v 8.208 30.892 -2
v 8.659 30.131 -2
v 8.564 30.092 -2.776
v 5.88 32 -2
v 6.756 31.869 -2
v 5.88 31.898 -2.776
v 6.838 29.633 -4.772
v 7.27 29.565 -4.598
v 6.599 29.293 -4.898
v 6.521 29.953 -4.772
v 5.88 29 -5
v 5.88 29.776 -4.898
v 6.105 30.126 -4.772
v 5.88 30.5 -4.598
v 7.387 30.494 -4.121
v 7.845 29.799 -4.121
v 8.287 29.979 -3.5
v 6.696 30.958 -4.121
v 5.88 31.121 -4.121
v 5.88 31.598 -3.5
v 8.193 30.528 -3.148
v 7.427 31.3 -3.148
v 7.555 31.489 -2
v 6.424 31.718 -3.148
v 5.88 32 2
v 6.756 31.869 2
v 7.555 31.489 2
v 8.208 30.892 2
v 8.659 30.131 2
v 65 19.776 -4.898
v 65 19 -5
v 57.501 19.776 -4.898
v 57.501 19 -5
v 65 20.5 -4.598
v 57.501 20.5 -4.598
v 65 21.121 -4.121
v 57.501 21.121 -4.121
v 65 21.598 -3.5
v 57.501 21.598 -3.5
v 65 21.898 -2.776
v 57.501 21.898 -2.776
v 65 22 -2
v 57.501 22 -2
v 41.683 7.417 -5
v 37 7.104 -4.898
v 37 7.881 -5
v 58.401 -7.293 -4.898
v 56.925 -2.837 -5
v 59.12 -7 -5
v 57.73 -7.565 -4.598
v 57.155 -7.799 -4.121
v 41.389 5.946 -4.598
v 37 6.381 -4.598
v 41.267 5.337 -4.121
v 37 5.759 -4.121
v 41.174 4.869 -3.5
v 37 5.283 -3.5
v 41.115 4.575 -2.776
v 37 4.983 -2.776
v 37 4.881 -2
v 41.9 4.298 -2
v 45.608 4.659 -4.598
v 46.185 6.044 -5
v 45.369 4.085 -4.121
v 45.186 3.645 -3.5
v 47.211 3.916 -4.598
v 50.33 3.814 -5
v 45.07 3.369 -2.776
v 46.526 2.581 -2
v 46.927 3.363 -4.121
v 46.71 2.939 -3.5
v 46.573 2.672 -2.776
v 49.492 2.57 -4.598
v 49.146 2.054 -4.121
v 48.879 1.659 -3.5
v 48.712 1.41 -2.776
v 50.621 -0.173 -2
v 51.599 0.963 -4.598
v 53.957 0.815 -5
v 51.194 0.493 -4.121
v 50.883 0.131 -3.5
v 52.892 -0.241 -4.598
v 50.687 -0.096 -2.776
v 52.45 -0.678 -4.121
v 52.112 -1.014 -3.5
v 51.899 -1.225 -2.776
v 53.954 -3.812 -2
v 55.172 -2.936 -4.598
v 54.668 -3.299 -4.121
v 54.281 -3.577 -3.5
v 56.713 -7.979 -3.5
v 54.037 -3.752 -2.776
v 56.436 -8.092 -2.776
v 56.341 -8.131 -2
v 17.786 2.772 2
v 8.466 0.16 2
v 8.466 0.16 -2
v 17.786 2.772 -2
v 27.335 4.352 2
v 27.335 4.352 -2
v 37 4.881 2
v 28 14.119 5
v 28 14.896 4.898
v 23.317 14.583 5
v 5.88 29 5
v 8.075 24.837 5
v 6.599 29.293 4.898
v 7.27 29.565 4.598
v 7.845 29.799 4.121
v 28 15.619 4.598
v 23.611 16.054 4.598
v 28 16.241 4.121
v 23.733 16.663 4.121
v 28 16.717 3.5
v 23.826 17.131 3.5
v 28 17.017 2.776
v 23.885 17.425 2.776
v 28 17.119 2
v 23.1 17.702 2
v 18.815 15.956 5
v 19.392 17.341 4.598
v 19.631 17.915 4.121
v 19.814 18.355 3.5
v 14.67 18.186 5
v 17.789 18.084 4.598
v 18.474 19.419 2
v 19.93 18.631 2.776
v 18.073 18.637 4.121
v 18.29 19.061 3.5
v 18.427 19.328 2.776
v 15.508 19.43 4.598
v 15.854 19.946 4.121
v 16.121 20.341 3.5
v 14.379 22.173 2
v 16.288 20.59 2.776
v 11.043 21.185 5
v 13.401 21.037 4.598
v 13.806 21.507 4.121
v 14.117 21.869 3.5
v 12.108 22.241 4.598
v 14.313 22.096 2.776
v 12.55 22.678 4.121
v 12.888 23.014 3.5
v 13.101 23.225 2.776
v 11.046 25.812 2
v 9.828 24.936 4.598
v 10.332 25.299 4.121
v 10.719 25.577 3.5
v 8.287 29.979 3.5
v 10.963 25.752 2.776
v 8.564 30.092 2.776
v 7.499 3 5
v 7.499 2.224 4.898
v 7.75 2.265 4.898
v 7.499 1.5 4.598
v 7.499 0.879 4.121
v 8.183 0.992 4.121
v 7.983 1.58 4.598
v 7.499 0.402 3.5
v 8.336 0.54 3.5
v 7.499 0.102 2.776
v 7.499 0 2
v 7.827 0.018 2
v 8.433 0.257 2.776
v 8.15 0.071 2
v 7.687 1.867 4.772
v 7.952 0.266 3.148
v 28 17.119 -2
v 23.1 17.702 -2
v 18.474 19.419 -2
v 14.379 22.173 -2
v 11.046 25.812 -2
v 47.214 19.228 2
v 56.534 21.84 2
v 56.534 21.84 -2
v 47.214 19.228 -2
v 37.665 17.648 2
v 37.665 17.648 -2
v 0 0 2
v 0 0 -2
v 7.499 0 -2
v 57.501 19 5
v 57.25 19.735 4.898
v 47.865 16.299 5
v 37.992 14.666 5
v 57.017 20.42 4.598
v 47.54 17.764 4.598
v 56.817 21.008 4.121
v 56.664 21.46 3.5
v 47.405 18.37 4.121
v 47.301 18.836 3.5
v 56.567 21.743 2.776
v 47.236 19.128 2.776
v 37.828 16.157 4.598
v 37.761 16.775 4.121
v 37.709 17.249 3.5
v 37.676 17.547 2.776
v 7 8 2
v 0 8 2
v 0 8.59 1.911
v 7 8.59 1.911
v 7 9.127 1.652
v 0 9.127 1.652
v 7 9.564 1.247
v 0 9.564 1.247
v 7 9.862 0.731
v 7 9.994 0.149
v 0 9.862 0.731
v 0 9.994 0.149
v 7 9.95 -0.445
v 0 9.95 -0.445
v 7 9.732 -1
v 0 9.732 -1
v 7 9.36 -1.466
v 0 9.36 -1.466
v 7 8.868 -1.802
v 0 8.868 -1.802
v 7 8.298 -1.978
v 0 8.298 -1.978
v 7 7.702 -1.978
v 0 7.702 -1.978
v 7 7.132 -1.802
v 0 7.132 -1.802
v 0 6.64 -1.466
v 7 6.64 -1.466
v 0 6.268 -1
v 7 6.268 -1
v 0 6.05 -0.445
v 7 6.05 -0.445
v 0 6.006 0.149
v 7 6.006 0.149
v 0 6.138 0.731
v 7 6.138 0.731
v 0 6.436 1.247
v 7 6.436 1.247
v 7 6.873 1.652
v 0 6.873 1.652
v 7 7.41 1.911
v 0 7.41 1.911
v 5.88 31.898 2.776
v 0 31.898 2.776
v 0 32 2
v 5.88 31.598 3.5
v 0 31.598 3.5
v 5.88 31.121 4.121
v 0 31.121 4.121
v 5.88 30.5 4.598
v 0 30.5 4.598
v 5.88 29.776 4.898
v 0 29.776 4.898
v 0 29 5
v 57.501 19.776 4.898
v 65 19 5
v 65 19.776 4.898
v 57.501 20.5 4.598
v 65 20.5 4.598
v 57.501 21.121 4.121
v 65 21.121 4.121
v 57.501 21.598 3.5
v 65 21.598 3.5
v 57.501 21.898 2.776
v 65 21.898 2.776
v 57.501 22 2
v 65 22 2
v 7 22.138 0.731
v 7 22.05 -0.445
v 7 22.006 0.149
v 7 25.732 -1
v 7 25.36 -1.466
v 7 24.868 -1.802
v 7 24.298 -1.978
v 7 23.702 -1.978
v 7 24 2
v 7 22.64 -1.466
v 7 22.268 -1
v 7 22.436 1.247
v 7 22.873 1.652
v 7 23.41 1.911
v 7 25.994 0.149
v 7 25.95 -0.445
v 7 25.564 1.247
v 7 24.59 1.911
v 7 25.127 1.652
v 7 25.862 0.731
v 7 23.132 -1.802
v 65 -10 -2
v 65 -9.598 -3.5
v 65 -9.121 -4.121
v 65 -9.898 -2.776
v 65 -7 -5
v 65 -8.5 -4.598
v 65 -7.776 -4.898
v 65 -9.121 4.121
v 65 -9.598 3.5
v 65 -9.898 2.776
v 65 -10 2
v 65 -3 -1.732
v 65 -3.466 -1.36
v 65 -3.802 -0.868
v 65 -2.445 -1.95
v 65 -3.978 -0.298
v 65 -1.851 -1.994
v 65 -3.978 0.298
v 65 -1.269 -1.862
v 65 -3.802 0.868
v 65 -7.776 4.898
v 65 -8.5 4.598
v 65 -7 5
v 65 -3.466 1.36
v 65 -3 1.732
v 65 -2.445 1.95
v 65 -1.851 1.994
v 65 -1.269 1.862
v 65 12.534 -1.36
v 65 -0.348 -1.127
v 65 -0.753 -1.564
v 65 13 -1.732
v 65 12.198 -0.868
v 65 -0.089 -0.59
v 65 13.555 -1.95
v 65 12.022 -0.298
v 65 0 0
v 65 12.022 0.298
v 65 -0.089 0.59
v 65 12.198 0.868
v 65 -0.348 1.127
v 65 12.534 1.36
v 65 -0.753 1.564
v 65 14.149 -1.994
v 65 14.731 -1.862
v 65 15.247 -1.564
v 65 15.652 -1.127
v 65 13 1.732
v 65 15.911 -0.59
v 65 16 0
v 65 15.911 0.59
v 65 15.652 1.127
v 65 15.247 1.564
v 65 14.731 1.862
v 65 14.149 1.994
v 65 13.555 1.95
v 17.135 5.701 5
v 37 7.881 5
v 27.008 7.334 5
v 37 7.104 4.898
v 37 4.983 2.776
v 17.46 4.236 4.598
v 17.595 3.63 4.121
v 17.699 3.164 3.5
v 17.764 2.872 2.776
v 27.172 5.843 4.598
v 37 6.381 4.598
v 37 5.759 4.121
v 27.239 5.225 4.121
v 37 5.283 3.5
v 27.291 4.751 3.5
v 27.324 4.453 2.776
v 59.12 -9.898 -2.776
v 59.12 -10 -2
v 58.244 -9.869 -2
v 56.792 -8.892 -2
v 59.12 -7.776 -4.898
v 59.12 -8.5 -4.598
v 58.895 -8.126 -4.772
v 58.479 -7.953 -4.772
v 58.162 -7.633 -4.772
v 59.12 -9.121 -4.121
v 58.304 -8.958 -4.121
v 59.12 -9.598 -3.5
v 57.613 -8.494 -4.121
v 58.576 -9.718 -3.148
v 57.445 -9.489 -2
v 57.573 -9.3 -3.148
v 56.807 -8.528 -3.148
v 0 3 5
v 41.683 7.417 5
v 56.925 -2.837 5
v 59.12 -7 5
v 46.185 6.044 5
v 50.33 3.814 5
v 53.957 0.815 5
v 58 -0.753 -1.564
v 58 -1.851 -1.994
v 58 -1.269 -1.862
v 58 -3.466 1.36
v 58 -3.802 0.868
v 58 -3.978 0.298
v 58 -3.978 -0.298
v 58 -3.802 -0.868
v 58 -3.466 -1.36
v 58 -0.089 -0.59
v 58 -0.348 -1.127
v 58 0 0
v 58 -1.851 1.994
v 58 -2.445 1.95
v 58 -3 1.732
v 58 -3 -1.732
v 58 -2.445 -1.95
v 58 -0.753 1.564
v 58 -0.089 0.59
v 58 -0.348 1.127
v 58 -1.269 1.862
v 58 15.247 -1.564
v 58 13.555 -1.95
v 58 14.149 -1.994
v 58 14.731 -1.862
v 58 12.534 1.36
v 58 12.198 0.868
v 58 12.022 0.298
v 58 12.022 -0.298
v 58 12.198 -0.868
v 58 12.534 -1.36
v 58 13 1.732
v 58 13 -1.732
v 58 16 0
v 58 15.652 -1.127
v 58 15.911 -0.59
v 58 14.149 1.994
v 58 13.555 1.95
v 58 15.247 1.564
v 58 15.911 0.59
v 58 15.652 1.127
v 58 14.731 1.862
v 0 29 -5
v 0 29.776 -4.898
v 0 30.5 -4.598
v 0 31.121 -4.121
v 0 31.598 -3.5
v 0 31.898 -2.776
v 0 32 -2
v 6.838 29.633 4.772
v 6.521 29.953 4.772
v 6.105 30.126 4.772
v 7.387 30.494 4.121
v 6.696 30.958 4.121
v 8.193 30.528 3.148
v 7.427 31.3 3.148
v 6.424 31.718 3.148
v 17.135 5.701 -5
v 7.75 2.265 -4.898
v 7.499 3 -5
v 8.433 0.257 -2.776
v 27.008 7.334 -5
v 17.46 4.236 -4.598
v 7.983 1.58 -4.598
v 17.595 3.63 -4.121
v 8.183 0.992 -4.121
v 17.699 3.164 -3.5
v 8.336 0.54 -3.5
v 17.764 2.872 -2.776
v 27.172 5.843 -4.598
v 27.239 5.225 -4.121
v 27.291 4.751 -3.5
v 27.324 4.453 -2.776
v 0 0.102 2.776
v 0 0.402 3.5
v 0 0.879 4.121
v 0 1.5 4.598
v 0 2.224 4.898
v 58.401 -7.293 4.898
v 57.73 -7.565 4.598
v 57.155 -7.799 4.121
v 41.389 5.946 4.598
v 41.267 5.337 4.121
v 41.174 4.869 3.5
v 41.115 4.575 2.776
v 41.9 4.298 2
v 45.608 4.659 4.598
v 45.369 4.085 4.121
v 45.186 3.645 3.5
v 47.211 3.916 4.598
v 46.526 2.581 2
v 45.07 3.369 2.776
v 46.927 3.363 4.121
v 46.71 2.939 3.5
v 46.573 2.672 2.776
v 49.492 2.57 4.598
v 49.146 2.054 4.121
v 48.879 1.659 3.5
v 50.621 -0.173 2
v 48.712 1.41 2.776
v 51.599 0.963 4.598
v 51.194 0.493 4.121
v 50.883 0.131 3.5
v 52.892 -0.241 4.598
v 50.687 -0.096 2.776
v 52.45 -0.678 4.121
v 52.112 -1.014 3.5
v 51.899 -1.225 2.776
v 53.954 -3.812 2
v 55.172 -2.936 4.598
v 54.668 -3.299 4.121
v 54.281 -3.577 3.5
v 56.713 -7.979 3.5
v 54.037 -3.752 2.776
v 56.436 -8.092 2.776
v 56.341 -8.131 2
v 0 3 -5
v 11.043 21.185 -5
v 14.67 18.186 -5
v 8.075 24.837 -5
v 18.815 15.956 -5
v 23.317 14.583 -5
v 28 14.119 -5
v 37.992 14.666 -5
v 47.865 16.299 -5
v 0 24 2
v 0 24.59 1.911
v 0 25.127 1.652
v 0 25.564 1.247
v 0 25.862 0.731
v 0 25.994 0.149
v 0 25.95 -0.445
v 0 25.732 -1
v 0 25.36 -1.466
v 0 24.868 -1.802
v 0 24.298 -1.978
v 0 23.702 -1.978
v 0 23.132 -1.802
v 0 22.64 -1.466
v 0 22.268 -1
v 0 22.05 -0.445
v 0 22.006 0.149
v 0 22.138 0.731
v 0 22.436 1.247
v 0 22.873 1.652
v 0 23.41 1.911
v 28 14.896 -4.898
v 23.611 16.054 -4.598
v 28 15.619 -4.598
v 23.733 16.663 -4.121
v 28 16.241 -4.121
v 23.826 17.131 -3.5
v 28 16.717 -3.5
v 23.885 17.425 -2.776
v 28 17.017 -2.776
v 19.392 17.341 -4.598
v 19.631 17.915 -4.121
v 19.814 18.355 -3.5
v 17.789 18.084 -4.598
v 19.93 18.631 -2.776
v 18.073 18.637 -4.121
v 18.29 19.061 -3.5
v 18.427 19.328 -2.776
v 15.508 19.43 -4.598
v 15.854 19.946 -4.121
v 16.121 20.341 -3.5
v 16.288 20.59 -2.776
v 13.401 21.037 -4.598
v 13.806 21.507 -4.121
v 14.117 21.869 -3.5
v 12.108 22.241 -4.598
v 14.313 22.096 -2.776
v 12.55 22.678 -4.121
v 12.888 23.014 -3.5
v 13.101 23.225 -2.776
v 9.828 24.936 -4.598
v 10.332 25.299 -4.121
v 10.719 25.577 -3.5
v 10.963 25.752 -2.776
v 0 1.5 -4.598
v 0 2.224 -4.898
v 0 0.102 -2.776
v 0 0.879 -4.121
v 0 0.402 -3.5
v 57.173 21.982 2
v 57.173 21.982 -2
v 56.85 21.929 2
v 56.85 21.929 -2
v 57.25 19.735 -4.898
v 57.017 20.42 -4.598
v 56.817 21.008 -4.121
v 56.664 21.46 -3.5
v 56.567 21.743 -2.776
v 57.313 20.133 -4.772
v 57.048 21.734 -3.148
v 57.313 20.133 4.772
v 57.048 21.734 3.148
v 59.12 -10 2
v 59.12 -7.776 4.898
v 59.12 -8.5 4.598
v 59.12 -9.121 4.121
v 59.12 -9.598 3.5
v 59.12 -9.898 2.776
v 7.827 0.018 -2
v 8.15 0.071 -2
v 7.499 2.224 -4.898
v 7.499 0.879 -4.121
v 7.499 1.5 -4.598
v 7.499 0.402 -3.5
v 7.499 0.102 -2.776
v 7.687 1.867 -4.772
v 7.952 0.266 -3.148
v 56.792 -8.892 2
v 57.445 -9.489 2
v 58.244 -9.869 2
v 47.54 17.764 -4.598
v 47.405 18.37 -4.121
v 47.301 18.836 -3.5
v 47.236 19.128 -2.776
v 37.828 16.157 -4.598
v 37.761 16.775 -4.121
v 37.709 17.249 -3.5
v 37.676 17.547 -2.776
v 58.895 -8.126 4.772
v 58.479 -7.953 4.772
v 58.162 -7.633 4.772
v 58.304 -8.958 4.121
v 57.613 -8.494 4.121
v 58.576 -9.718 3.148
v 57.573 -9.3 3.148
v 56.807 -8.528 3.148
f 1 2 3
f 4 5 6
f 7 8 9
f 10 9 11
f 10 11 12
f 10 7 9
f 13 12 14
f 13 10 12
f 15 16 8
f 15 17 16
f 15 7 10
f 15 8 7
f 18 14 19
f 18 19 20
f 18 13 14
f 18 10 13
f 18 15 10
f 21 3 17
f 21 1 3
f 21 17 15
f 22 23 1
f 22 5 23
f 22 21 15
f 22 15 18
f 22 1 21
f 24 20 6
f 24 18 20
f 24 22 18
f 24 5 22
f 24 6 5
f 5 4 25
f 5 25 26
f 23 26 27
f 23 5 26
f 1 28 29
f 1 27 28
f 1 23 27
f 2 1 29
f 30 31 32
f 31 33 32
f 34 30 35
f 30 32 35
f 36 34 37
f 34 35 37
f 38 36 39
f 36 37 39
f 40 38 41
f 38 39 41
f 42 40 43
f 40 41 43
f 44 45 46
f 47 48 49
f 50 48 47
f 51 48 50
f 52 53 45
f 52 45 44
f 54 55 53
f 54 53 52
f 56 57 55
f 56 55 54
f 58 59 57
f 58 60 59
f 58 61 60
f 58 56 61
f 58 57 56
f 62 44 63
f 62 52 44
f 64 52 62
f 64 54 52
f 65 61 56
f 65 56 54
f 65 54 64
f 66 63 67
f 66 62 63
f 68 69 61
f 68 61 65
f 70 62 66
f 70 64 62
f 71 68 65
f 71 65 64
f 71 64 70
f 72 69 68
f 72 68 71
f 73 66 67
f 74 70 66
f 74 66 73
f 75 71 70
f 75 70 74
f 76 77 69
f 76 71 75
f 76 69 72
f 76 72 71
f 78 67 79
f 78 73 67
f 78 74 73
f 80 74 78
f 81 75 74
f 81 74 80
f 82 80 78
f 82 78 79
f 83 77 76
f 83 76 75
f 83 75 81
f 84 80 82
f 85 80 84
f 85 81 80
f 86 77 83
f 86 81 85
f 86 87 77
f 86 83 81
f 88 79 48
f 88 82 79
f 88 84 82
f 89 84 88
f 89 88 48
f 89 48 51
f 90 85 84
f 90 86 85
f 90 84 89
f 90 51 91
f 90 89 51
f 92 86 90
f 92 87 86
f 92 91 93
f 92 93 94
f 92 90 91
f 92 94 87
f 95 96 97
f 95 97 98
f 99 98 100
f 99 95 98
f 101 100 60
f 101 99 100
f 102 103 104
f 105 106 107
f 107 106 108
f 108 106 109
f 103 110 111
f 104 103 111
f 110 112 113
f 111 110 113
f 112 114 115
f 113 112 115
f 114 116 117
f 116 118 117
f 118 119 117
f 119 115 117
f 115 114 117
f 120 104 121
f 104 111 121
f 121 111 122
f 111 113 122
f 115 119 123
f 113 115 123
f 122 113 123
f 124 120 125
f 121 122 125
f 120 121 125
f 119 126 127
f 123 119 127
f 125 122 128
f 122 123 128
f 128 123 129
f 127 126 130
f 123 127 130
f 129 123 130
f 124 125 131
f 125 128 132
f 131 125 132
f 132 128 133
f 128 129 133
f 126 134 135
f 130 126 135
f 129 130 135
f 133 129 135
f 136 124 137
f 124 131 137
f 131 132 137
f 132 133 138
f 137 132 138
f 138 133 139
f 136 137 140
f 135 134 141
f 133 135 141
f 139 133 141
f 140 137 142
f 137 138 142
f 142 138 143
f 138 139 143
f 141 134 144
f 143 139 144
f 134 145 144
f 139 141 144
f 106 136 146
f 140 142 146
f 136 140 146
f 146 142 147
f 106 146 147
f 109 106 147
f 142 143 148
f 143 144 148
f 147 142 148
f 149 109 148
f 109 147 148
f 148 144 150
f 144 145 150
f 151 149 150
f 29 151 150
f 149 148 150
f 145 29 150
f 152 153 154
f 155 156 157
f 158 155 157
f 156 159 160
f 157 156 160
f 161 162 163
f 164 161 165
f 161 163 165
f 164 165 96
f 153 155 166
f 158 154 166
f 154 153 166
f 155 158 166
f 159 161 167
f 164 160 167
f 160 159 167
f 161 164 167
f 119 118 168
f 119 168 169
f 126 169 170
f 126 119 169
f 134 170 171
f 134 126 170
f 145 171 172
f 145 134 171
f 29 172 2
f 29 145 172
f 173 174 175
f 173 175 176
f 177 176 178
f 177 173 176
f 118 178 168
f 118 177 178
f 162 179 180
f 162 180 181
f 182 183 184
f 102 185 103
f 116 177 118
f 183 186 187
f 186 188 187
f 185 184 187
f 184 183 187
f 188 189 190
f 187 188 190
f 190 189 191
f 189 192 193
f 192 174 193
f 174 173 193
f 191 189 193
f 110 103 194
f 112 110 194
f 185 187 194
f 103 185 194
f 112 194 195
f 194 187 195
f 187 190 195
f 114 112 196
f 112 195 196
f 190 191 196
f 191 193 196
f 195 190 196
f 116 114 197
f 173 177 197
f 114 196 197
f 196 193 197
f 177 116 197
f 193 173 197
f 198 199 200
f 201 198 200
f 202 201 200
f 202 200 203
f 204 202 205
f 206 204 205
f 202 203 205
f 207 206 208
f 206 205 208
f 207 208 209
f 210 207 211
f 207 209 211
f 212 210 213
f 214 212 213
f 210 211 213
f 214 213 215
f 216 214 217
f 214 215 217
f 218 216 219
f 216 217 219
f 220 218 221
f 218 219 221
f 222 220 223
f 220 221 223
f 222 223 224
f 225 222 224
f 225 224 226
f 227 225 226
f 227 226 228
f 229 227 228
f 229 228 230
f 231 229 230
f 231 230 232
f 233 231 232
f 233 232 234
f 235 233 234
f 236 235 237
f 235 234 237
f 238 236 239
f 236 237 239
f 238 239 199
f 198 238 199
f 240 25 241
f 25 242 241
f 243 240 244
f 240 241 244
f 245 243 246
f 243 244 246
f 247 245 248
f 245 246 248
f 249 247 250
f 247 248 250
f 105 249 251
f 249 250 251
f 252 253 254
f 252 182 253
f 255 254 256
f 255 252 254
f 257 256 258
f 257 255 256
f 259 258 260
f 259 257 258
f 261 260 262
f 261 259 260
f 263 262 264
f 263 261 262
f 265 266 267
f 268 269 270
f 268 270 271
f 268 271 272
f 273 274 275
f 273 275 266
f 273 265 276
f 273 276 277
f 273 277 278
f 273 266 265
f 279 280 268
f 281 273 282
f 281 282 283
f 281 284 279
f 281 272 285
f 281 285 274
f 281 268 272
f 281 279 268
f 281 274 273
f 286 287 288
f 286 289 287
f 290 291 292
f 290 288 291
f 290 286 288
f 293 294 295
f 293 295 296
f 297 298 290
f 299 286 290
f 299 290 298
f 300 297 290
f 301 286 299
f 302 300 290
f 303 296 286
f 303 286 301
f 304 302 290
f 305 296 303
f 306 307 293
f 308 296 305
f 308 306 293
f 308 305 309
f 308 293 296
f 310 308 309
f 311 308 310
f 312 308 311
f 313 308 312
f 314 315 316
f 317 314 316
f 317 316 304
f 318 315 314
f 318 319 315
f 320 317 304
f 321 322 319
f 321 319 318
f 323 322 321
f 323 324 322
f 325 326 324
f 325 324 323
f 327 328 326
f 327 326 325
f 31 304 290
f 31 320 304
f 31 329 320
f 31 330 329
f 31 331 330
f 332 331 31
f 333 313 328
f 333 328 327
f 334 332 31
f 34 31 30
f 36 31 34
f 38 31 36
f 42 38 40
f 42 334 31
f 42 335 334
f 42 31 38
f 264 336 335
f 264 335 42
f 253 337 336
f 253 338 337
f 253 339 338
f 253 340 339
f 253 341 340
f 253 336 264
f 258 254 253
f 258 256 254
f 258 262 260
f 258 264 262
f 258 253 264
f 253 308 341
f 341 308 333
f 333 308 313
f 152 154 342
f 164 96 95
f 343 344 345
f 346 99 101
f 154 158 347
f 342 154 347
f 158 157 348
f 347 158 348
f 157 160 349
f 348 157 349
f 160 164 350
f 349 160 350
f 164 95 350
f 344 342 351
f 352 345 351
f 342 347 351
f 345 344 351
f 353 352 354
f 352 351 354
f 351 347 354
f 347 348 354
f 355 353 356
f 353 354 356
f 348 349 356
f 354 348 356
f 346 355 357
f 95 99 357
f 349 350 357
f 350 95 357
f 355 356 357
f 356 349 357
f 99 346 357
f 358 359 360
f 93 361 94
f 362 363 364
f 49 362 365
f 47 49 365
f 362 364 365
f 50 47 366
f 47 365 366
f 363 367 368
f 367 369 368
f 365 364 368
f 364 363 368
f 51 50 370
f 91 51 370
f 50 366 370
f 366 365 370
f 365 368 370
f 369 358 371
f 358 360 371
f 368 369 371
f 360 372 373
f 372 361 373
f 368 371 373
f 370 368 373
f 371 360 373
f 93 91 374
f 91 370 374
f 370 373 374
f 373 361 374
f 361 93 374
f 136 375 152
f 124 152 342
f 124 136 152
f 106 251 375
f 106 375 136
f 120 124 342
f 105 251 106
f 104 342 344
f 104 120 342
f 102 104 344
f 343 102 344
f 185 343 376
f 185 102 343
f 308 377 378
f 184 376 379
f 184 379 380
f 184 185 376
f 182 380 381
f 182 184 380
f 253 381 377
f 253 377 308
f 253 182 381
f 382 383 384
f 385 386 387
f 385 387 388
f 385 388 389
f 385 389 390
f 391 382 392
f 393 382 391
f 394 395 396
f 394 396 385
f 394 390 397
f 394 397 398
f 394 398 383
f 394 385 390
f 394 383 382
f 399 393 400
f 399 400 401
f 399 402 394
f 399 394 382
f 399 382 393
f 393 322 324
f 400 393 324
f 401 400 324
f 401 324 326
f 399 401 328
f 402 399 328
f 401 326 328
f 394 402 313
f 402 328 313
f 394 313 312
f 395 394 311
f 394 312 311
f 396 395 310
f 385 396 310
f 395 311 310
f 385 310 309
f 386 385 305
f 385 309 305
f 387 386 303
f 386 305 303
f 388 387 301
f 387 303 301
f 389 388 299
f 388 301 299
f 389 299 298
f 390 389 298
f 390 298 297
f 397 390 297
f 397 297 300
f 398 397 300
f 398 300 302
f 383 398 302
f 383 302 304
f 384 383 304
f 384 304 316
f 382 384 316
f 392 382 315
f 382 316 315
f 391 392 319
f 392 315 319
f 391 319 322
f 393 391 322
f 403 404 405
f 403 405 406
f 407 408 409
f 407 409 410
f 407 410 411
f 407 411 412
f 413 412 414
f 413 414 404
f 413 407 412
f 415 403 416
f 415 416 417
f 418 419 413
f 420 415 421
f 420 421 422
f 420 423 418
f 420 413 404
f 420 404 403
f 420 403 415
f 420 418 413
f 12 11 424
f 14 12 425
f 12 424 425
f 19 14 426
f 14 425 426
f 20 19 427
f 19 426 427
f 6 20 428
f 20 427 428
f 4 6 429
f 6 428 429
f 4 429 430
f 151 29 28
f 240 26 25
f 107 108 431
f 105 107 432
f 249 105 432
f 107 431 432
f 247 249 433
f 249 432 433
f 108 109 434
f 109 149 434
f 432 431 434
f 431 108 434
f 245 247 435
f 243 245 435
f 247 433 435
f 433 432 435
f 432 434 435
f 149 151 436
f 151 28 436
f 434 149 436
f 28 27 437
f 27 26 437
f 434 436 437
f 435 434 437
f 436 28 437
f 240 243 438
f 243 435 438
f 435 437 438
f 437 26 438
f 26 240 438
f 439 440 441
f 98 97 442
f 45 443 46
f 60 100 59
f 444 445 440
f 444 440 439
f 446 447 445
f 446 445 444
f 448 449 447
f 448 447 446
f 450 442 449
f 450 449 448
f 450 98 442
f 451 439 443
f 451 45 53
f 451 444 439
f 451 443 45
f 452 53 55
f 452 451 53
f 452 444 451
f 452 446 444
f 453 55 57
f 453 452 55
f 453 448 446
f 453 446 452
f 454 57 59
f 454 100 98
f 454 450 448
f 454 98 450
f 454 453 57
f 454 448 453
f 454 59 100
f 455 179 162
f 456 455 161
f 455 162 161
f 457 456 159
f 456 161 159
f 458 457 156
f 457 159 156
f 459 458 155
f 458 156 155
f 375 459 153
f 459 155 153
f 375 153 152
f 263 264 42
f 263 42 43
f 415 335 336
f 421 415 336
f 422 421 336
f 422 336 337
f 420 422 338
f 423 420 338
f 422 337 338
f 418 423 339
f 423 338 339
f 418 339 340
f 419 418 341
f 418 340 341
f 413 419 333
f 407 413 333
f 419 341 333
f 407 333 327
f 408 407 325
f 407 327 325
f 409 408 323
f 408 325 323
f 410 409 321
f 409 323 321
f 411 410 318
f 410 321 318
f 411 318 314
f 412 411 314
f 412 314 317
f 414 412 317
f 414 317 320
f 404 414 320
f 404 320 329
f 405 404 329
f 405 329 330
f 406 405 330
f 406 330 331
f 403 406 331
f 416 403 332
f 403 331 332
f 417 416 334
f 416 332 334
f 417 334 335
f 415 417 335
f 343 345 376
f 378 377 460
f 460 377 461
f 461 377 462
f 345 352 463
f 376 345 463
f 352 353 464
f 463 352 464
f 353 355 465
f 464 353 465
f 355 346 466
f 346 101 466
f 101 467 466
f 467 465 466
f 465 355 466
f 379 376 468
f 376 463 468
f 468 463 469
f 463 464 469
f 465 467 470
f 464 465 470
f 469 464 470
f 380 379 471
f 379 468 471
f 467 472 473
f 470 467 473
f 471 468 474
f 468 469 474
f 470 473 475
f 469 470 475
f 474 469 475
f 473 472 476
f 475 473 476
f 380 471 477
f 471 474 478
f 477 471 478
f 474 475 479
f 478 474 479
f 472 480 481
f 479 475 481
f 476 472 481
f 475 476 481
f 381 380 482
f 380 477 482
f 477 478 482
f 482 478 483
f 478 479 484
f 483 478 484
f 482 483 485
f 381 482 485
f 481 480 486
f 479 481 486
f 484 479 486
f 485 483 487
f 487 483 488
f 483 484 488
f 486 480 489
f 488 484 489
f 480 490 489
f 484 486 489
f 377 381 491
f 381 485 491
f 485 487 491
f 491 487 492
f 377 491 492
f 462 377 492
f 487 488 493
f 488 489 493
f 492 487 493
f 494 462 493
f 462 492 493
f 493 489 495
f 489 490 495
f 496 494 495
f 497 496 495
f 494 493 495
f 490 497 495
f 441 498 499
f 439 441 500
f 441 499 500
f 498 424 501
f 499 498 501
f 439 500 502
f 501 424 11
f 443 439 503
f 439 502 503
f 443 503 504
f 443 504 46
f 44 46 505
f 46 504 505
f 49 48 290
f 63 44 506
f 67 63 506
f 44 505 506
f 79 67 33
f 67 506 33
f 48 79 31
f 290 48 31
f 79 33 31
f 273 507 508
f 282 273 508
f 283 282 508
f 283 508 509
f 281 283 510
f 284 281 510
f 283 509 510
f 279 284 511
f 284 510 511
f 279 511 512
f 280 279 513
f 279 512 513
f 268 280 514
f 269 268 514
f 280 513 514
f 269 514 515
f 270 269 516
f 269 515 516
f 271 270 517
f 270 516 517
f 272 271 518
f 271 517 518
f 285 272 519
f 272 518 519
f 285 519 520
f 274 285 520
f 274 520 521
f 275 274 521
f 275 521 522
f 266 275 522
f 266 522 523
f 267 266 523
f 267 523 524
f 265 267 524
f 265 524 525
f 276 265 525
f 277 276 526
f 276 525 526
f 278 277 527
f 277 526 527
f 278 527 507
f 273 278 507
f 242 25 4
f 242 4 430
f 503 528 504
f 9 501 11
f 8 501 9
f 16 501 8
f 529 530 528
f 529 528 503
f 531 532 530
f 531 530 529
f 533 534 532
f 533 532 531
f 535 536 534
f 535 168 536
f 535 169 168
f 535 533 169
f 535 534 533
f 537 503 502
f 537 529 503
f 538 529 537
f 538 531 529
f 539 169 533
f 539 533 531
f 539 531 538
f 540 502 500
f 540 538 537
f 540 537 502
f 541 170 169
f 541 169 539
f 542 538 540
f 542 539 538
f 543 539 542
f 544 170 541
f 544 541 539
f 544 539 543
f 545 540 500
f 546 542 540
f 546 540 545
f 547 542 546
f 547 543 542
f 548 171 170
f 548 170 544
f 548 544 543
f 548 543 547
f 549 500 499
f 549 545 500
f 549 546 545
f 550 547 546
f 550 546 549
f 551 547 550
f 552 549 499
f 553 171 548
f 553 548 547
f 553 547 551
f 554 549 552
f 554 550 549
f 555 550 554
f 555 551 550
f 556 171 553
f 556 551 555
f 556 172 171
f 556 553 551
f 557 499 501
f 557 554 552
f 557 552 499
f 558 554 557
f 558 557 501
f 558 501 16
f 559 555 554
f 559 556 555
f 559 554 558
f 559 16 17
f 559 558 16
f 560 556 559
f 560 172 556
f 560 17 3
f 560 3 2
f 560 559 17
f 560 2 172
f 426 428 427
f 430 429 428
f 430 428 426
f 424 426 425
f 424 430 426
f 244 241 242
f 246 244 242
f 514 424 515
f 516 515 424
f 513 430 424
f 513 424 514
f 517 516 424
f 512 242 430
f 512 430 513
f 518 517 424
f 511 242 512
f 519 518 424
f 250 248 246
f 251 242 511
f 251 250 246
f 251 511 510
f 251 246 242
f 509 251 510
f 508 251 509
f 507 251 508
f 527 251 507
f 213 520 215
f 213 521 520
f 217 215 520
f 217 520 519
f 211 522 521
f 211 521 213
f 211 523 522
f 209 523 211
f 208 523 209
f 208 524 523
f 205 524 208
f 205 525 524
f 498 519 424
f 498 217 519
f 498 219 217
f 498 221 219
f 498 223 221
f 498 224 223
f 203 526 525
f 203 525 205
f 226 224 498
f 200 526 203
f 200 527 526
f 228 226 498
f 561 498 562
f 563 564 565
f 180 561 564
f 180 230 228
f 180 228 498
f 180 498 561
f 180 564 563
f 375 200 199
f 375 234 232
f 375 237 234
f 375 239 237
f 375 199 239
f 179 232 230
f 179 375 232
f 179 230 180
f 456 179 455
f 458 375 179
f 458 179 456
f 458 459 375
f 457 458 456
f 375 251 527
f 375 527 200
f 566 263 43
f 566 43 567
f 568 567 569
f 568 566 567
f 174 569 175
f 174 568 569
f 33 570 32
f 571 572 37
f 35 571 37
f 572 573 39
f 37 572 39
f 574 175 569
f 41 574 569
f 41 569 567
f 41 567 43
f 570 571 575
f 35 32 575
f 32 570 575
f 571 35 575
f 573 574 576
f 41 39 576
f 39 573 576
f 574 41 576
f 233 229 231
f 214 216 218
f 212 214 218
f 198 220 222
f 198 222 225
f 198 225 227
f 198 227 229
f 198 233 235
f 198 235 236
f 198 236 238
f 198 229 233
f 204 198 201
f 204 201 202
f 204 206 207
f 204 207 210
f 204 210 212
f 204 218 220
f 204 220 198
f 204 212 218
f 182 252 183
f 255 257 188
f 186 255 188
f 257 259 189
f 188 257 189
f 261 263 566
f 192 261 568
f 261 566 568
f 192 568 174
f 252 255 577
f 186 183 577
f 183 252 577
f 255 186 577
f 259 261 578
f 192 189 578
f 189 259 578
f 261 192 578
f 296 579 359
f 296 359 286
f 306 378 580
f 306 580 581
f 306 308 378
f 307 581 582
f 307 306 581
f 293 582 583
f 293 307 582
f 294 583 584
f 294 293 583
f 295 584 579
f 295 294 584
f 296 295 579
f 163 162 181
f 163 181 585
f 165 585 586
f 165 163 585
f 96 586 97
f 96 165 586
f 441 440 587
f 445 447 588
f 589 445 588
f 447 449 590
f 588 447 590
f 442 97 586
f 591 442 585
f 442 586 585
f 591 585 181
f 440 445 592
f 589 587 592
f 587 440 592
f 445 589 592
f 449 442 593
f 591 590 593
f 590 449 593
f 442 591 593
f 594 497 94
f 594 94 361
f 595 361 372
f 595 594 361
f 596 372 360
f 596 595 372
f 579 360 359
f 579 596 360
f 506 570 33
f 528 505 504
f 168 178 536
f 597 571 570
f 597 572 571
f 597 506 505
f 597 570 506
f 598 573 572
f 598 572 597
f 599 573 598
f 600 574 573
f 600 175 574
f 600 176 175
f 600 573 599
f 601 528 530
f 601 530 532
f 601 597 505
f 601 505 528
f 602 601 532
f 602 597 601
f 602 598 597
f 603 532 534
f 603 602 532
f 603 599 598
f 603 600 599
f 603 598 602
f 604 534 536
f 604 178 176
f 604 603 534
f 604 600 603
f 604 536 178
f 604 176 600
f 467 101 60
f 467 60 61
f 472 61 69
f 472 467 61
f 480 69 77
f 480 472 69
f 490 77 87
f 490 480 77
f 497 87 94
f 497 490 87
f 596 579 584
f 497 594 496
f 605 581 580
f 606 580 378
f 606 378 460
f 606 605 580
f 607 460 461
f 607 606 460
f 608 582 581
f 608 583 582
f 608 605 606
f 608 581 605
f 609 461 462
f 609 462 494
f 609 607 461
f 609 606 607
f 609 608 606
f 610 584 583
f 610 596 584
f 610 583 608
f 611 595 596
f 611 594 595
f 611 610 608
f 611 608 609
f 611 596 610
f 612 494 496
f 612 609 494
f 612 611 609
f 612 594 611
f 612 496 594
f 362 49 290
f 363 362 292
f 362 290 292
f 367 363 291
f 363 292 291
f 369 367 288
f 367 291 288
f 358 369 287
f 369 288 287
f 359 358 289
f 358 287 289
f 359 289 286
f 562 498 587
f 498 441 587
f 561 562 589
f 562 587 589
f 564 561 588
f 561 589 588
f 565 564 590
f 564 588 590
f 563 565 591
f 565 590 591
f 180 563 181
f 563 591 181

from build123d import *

# Parameters (mm, degrees)
BOSS_EXTRUDE1_DEPTH = 5
SKETCH2_R           = 2
CUT_EXTRUDE1_DEPTH  = 7
SKETCH3_R           = 2
CUT_EXTRUDE2_DEPTH  = 7
FILLET1_R           = 3


with BuildPart() as part:
    # Sketch1 → Boss-Extrude1 (new, symmetric)
    with BuildSketch(Plane.XY):
        with BuildLine():
            Line((0, 32), (0, 0))
            Line((0, 0), (8, 0))
            ThreePointArc((8, 0), (22.296085696, 3.651940128), (37, 4.880613018))
            ThreePointArc((37, 4.880613018), (49.464275388, 0.752368163), (57, -10))
            Line((57, -10), (65, -10))
            Line((65, -10), (65, 22))
            Line((65, 22), (57, 22))
            ThreePointArc((57, 22), (42.703914304, 18.348059872), (28, 17.119386982))
            ThreePointArc((28, 17.119386982), (15.535724612, 21.247631837), (8, 32))
            Line((8, 32), (0, 32))
        make_face()
    extrude(amount=BOSS_EXTRUDE1_DEPTH, both=True)

    # Sketch2 → Cut-Extrude1 (cut)
    with BuildSketch(Plane(origin=(65, 0, 0), x_dir=(0, 0, -1), z_dir=(1, 0, 0))):
        with Locations(Location((0, -2, 0), (0, 0, 90))):
            Circle(SKETCH2_R)
        with Locations(Location((0, 14, 0), (0, 0, 90))):
            Circle(SKETCH2_R)
    extrude(amount=-CUT_EXTRUDE1_DEPTH, mode=Mode.SUBTRACT)

    # Sketch3 → Cut-Extrude2 (cut)
    with BuildSketch(Plane.ZY):
        with Locations((0, 8)):
            Circle(SKETCH3_R)
        with Locations((0, 24)):
            Circle(SKETCH3_R)
    extrude(amount=-CUT_EXTRUDE2_DEPTH, mode=Mode.SUBTRACT)

    # Fillet1
    fillet1_edges = [part.edges().sort_by_distance(p)[0] for p in [
        (15.535724612, 21.247631837, -5),
        (42.703914304, 18.348059872, -5),
        (61, 22, -5),
        (61, -10, -5),
        (49.464275388, 0.752368163, -5),
        (22.296085696, 3.651940128, -5),
        (4, 0, 5),
        (4, 0, -5),
        (4, 32, -5),
        (22.296085696, 3.651940128, 5),
        (8, 32, 0),
        (57, 22, 0),
        (57, -10, 0),
        (8, 0, 0),
        (49.464275388, 0.752368163, 5),
        (61, -10, 5),
        (61, 22, 5),
        (42.703914304, 18.348059872, 5),
        (15.535724612, 21.247631837, 5),
        (4, 32, 5),
    ]]
    fillet(fillet1_edges, radius=FILLET1_R)


solid = part.part
